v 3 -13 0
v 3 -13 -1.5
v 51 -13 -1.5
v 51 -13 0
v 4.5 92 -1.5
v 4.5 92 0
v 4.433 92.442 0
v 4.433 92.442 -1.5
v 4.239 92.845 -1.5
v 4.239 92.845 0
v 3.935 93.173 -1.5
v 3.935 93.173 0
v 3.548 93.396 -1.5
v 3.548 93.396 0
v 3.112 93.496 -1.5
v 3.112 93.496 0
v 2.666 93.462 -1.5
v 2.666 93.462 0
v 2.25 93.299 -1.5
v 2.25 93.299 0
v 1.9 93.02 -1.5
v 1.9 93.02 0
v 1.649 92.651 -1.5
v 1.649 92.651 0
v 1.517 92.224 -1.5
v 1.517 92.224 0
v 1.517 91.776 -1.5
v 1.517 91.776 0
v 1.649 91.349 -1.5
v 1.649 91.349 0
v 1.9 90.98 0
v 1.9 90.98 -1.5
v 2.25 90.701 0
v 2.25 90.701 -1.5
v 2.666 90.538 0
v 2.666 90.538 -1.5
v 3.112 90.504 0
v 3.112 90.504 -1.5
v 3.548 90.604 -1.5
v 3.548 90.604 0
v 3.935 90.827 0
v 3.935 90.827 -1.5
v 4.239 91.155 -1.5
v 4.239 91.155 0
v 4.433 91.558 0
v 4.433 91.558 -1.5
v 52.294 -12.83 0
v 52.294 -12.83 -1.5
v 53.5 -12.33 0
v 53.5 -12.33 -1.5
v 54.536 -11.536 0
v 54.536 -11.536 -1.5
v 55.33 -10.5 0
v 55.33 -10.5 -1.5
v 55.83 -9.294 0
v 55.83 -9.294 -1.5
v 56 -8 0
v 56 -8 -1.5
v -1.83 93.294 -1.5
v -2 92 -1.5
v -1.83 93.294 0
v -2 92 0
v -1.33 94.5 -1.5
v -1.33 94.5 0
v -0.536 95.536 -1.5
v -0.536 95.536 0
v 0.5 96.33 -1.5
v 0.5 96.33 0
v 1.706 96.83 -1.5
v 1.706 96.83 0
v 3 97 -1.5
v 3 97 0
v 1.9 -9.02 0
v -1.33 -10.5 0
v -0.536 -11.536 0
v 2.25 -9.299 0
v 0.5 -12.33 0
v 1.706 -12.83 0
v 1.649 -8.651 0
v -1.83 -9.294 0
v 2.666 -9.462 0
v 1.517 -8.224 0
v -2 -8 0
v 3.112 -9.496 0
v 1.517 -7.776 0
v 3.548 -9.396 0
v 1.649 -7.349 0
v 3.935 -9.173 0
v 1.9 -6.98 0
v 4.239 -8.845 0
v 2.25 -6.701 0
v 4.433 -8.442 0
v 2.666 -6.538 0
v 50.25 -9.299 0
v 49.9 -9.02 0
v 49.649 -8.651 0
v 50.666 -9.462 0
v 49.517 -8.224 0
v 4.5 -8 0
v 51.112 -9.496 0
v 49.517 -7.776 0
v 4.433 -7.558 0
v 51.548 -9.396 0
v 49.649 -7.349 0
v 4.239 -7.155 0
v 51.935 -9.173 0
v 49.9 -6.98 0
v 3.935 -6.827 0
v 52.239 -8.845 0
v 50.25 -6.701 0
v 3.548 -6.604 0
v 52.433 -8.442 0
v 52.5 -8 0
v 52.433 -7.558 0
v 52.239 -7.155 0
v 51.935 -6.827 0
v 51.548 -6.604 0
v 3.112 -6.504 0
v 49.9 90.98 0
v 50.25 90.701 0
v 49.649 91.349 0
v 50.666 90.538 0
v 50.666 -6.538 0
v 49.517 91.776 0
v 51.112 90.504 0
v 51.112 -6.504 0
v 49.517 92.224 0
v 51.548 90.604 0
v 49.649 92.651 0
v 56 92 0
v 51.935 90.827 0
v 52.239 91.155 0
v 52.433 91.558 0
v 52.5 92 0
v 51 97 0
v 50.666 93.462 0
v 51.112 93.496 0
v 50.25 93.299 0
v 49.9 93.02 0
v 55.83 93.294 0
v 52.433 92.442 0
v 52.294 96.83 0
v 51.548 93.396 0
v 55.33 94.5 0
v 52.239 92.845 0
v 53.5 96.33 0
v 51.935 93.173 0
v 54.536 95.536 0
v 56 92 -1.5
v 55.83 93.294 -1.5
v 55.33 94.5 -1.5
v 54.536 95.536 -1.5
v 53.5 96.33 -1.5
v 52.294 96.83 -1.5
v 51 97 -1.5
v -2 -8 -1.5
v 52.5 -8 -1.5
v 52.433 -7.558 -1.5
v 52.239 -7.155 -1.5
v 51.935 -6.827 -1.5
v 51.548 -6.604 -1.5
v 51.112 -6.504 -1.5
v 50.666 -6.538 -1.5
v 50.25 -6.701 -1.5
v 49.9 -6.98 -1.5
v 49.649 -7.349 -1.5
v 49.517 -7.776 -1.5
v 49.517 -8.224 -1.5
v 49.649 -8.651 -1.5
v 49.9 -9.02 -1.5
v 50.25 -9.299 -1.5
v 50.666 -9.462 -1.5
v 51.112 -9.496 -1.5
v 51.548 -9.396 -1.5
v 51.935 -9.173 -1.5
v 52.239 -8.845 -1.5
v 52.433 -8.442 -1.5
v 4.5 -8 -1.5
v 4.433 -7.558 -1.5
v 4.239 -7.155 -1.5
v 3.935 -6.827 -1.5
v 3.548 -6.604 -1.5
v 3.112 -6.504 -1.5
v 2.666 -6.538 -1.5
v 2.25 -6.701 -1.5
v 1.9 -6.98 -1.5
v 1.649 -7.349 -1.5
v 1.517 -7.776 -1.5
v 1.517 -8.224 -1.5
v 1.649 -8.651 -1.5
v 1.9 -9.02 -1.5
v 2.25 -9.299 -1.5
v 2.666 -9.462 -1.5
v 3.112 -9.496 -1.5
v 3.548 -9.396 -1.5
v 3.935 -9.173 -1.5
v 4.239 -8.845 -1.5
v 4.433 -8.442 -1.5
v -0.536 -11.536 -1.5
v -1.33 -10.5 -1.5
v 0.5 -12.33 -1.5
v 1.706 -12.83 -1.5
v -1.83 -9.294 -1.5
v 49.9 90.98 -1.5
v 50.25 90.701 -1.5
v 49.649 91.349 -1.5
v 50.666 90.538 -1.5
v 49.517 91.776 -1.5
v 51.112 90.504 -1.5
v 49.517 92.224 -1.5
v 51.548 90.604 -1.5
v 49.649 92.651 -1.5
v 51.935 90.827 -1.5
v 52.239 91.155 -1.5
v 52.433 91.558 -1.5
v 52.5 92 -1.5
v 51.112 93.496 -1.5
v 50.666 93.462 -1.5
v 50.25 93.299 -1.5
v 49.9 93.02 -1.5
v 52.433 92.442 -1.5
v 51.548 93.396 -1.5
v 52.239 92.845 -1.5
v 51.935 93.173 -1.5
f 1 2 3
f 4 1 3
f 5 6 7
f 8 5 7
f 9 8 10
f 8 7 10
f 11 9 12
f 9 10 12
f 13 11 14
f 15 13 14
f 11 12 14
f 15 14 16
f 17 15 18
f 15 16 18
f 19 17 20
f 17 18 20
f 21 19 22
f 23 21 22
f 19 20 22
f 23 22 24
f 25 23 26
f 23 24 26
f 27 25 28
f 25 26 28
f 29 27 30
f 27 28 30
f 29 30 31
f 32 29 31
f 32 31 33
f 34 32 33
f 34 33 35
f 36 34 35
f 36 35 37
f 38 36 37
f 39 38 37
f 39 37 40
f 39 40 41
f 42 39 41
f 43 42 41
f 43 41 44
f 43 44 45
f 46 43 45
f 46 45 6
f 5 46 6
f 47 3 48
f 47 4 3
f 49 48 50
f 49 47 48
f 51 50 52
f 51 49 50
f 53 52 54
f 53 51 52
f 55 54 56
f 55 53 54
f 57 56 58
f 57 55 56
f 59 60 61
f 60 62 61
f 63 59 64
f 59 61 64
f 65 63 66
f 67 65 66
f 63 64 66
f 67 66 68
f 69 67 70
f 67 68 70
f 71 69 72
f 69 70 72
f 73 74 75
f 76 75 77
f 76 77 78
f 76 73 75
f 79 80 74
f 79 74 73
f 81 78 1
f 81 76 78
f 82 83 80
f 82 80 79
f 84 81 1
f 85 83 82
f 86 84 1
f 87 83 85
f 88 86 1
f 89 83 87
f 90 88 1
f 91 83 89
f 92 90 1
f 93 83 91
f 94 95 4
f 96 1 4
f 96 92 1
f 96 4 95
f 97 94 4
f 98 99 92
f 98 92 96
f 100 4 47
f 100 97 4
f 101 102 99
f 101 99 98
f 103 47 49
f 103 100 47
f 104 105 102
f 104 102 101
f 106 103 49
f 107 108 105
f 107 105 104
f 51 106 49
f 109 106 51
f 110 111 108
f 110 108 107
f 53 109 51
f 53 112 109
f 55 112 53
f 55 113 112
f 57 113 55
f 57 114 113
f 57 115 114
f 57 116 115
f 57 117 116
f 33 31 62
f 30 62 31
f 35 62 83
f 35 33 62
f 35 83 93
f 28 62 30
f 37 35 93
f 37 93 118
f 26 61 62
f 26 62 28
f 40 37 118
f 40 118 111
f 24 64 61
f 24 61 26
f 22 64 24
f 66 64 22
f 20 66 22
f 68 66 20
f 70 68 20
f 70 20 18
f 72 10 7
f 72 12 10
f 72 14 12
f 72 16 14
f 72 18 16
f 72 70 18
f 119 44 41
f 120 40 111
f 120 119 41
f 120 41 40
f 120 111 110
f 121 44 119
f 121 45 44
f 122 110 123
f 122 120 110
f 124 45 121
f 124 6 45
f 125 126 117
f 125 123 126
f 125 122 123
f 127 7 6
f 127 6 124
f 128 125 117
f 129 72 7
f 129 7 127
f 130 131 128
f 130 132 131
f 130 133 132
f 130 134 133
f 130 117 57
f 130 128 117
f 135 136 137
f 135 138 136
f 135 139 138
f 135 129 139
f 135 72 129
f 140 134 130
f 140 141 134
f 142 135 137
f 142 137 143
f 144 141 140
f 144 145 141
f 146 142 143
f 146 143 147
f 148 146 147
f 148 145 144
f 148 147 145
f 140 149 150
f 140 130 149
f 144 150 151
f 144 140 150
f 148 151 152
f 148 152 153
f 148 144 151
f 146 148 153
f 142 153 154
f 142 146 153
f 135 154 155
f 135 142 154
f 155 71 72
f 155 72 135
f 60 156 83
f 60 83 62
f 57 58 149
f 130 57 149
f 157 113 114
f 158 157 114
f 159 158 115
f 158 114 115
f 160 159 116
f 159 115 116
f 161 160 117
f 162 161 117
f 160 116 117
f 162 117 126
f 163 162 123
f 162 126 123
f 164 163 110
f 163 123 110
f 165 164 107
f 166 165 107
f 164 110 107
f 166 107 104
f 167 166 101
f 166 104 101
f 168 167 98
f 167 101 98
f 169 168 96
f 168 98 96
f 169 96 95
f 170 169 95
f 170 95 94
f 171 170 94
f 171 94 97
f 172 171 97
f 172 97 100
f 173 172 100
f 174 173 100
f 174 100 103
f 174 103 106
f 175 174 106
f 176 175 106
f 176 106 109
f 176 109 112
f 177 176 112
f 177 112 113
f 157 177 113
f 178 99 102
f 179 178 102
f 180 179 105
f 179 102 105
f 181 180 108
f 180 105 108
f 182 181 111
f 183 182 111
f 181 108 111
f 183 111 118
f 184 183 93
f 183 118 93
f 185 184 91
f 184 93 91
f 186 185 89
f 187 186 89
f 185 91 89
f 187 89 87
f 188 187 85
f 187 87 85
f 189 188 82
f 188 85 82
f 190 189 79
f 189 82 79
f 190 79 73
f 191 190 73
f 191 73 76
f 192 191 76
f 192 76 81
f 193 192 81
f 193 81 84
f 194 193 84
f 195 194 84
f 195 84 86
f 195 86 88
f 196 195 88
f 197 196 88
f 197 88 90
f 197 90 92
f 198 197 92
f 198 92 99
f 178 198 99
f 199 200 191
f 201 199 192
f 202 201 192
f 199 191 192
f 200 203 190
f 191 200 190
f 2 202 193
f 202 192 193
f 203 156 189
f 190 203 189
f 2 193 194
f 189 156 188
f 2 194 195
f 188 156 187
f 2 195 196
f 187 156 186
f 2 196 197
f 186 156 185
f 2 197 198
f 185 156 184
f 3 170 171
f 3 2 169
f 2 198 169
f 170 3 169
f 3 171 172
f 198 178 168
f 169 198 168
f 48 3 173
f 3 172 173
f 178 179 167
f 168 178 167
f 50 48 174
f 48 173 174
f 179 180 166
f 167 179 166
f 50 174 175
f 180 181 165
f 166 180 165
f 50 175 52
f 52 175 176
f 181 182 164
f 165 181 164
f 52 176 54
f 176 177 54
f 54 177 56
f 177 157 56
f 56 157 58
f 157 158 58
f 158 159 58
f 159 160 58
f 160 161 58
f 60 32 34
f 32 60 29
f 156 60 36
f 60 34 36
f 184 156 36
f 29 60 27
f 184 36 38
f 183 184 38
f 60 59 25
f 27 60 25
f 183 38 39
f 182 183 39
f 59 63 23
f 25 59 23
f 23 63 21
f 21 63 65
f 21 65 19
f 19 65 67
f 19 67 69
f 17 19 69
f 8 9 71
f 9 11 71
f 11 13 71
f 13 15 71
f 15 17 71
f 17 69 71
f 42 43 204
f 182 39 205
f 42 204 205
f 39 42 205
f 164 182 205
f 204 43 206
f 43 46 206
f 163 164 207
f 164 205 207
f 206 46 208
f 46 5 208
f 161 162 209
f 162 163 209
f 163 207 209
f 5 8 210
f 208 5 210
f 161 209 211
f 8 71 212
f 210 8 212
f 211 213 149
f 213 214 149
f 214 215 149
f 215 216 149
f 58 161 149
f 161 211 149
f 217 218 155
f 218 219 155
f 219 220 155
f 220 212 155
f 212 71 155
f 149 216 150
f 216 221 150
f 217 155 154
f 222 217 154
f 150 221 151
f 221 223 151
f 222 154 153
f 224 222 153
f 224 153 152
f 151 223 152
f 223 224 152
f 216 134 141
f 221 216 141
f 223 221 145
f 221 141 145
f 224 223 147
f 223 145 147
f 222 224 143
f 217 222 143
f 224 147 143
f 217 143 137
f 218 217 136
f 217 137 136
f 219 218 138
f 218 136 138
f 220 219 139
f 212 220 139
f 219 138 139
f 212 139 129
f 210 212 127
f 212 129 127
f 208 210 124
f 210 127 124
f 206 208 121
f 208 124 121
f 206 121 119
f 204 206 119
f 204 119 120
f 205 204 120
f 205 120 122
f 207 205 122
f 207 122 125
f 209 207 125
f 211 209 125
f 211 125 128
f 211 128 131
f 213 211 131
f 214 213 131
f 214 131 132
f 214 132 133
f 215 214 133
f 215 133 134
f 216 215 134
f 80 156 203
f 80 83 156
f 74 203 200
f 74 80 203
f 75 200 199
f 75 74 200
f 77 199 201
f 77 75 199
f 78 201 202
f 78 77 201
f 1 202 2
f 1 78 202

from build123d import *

# Parameters (mm, degrees)
BOX005_W        = 58
BOX005_H        = 110
BOX005_DEPTH    = 1.5
FILLET002_R     = 5
SKETCH008_R     = 1.5
POCKET003_DEPTH = 5


with BuildPart() as part:
    # Box005 → Box005 (new body)
    with BuildSketch(Plane(origin=(-2, -13, -1.5), x_dir=(1, 0, 0), z_dir=(0, 0, 1))):
        with Locations((29, 55)):
            Rectangle(BOX005_W, BOX005_H)
    extrude(amount=BOX005_DEPTH)

    # Fillet002
    fillet002_edges = [part.edges().sort_by_distance(p)[0] for p in [
        (-2, -13, -0.75),
        (-2, 97, -0.75),
        (56, -13, -0.75),
        (56, 97, -0.75),
    ]]
    fillet(fillet002_edges, radius=FILLET002_R)

    # Sketch008 → Pocket003 (cut)
    with BuildSketch(Plane.XY):
        with Locations((3, 92)):
            Circle(SKETCH008_R)
        with Locations((51, 92)):
            Circle(SKETCH008_R)
        with Locations((3, -8)):
            Circle(SKETCH008_R)
        with Locations((51, -8)):
            Circle(SKETCH008_R)
    extrude(amount=-POCKET003_DEPTH, mode=Mode.SUBTRACT)


solid = part.part
